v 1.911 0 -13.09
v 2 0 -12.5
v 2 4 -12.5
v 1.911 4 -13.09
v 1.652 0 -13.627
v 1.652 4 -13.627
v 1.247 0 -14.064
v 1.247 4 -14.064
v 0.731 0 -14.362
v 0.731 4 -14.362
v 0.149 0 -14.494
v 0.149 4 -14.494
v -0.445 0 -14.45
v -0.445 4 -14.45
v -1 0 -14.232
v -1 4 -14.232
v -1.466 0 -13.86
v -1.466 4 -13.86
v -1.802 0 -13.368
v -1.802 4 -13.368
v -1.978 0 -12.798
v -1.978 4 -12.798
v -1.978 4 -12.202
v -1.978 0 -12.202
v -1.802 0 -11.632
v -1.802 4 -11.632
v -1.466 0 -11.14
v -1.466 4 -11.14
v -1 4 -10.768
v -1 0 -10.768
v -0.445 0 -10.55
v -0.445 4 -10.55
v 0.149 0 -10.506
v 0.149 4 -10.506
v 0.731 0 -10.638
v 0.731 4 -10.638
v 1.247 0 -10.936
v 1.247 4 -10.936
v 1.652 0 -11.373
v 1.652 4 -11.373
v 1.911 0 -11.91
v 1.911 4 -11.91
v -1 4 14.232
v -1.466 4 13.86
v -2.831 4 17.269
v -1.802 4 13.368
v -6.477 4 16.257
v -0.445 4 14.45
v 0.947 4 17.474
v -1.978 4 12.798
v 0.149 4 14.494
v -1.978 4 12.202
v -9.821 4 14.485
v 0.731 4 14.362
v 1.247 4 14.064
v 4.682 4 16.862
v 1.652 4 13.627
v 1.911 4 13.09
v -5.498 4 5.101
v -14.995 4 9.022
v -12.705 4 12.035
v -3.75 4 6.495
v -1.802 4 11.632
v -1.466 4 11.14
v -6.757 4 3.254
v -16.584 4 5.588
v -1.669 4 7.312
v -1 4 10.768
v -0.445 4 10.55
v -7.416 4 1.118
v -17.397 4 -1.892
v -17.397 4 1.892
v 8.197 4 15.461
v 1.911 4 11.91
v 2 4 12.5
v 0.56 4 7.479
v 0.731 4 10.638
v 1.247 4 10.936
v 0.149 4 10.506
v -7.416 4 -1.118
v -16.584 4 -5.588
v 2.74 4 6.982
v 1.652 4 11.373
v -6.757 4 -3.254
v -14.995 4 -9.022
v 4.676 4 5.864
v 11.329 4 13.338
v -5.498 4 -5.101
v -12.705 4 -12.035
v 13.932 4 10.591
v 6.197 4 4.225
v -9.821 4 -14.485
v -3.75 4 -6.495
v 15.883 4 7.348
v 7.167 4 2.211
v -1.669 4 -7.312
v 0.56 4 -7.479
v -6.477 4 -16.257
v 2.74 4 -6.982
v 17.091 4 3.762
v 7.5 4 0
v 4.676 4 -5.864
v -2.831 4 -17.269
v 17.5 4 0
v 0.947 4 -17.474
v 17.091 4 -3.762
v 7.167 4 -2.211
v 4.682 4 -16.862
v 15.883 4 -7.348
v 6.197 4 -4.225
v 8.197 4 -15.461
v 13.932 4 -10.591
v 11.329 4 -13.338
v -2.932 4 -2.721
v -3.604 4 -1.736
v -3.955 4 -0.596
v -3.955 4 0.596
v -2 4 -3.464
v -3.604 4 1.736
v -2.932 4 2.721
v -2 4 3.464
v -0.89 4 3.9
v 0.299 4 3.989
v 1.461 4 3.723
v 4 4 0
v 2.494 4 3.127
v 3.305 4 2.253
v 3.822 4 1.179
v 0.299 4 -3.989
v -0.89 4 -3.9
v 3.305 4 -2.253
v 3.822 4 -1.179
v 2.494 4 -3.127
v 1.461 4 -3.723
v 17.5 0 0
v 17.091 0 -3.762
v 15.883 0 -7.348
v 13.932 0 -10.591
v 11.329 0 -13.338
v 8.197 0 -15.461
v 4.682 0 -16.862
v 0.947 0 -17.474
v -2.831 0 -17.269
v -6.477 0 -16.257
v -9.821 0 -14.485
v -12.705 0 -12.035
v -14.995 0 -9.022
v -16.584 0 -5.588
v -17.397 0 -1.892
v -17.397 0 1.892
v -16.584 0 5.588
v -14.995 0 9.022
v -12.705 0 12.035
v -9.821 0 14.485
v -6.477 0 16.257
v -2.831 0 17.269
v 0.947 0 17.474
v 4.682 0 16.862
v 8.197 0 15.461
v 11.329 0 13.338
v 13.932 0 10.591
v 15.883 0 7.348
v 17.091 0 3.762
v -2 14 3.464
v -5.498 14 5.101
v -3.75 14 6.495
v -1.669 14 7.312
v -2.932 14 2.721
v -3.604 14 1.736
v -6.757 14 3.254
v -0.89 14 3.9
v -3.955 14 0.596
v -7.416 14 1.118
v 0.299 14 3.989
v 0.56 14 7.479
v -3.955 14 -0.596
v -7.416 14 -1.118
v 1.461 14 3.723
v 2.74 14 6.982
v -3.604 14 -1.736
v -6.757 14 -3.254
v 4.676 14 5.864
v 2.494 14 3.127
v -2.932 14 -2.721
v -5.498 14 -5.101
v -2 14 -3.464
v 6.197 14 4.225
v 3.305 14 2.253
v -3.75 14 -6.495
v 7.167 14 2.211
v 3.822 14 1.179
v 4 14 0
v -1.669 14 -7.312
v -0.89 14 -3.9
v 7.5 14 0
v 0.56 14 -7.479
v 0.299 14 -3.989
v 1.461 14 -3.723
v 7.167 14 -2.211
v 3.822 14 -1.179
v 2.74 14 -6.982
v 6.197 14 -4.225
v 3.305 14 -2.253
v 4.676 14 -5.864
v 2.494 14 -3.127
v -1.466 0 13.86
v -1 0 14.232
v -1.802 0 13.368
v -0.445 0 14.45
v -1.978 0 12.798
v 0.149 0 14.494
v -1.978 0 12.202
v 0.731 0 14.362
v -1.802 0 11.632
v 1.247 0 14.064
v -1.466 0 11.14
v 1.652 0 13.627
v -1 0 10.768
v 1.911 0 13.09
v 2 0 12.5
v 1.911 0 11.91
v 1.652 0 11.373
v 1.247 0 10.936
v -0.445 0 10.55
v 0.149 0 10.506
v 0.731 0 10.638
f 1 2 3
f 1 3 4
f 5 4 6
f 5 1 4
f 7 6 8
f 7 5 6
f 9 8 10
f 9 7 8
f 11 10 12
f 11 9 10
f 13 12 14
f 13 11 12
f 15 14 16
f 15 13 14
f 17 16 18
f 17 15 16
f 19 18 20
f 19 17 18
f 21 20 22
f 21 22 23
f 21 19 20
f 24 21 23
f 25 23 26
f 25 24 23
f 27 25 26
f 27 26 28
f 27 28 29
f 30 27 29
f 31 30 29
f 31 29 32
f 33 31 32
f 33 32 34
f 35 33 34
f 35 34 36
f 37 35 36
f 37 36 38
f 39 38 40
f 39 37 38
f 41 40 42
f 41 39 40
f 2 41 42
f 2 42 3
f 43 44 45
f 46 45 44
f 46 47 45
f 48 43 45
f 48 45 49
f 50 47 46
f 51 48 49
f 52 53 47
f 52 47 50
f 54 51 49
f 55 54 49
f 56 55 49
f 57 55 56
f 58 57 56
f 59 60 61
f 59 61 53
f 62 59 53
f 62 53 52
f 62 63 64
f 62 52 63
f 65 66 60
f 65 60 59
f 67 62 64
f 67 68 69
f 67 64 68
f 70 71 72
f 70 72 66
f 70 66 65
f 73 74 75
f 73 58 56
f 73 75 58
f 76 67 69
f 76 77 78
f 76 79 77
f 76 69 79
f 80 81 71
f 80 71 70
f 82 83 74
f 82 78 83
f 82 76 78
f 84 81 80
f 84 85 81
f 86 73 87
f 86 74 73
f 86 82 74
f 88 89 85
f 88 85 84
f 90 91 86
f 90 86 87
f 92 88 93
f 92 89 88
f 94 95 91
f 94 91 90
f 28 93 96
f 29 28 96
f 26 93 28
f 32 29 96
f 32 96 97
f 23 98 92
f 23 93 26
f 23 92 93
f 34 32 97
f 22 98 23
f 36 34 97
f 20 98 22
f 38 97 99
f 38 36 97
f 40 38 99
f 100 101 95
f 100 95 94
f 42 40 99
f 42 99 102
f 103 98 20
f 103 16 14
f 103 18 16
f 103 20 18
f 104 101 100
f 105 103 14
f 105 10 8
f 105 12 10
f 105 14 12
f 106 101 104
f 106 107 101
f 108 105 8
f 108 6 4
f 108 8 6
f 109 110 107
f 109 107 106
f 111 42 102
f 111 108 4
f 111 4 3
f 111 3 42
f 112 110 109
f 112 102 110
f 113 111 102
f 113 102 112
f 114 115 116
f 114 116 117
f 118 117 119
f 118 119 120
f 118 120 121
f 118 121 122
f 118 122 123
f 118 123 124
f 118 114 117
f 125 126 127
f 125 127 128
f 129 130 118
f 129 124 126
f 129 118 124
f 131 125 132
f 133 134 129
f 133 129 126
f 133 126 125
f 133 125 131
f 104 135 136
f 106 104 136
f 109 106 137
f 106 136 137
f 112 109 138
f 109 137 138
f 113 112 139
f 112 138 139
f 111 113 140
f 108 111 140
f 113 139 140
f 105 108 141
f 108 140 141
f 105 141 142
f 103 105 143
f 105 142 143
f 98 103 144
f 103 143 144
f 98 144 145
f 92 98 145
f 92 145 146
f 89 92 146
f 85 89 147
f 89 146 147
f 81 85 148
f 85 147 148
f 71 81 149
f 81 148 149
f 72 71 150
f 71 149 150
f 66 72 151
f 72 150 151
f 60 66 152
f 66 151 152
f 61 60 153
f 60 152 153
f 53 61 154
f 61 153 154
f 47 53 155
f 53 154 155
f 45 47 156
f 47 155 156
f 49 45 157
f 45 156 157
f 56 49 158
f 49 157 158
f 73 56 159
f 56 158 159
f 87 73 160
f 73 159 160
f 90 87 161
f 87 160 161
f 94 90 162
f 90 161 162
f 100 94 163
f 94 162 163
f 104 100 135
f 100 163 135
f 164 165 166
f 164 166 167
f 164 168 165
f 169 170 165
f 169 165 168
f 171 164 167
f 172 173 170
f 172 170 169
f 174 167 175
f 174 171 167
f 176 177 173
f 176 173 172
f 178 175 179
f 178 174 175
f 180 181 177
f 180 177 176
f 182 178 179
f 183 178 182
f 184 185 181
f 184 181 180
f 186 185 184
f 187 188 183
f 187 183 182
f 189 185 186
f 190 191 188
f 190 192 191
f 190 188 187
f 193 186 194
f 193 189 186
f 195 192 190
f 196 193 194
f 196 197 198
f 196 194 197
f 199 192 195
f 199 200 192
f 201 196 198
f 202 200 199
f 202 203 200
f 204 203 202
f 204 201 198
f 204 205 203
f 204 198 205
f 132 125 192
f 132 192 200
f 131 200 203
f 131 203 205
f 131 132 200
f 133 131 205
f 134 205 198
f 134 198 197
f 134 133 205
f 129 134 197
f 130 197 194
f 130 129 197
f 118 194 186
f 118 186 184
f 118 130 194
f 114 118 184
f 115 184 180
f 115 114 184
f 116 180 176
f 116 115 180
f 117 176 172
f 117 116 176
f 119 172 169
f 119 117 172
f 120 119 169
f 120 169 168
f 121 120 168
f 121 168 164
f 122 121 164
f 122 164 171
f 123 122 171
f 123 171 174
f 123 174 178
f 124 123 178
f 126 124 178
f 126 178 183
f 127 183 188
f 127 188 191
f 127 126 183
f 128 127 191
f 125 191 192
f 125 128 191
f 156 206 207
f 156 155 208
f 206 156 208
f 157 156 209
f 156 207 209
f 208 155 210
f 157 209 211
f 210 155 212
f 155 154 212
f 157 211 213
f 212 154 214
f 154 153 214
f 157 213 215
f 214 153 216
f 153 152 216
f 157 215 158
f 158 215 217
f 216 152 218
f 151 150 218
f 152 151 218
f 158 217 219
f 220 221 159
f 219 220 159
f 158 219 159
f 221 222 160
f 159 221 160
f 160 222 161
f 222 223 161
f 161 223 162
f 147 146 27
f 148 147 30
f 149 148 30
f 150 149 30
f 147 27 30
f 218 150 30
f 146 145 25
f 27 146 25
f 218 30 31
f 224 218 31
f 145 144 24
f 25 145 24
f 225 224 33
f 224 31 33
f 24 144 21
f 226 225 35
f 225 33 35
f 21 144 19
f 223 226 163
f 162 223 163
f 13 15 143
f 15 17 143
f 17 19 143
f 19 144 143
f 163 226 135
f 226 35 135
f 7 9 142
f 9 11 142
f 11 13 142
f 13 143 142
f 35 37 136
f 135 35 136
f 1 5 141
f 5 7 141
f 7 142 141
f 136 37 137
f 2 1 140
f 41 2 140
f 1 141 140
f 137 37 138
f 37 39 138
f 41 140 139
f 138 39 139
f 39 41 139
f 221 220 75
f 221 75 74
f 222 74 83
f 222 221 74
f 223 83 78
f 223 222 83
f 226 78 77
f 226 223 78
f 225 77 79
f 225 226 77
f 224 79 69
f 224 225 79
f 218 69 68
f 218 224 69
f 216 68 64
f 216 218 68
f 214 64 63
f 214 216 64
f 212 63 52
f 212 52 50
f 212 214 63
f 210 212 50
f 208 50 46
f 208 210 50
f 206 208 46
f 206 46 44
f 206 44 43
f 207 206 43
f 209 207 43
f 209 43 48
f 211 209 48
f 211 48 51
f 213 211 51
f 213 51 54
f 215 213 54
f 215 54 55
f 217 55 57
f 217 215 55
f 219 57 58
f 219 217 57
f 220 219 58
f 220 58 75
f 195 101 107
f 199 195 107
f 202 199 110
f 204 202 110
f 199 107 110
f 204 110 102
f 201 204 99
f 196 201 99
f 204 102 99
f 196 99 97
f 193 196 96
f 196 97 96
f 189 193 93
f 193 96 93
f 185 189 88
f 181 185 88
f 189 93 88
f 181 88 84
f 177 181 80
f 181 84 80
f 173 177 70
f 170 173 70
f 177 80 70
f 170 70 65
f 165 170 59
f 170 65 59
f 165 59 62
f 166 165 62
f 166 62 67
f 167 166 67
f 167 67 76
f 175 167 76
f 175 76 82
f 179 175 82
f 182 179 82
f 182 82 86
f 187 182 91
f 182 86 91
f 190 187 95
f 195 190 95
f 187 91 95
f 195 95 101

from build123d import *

# Parameters (mm, degrees)
SKETCH1_R           = 17.5
SKETCH1_R_2         = 2
BOSS_EXTRUDE1_DEPTH = 4
SKETCH2_R           = 7.5
SKETCH2_R_2         = 4
BOSS_EXTRUDE2_DEPTH = 10


with BuildPart() as part:
    # Sketch1 → Boss-Extrude1 (new body)
    with BuildSketch(Plane(origin=(0, 0, 0), x_dir=(1, 0, 0), z_dir=(0, 1, 0))):
        Circle(SKETCH1_R)
        with Locations((0, 12.5)):
            Circle(SKETCH1_R_2, mode=Mode.SUBTRACT)
        with Locations((0, -12.5)):
            Circle(SKETCH1_R_2, mode=Mode.SUBTRACT)
    extrude(amount=BOSS_EXTRUDE1_DEPTH)

    # Sketch2 → Boss-Extrude2 (add)
    with BuildSketch(Plane(origin=(0, 4, 0), x_dir=(1, 0, 0), z_dir=(0, 1, 0))):
        Circle(SKETCH2_R)
        Circle(SKETCH2_R_2, mode=Mode.SUBTRACT)
    extrude(amount=BOSS_EXTRUDE2_DEPTH)


solid = part.part
